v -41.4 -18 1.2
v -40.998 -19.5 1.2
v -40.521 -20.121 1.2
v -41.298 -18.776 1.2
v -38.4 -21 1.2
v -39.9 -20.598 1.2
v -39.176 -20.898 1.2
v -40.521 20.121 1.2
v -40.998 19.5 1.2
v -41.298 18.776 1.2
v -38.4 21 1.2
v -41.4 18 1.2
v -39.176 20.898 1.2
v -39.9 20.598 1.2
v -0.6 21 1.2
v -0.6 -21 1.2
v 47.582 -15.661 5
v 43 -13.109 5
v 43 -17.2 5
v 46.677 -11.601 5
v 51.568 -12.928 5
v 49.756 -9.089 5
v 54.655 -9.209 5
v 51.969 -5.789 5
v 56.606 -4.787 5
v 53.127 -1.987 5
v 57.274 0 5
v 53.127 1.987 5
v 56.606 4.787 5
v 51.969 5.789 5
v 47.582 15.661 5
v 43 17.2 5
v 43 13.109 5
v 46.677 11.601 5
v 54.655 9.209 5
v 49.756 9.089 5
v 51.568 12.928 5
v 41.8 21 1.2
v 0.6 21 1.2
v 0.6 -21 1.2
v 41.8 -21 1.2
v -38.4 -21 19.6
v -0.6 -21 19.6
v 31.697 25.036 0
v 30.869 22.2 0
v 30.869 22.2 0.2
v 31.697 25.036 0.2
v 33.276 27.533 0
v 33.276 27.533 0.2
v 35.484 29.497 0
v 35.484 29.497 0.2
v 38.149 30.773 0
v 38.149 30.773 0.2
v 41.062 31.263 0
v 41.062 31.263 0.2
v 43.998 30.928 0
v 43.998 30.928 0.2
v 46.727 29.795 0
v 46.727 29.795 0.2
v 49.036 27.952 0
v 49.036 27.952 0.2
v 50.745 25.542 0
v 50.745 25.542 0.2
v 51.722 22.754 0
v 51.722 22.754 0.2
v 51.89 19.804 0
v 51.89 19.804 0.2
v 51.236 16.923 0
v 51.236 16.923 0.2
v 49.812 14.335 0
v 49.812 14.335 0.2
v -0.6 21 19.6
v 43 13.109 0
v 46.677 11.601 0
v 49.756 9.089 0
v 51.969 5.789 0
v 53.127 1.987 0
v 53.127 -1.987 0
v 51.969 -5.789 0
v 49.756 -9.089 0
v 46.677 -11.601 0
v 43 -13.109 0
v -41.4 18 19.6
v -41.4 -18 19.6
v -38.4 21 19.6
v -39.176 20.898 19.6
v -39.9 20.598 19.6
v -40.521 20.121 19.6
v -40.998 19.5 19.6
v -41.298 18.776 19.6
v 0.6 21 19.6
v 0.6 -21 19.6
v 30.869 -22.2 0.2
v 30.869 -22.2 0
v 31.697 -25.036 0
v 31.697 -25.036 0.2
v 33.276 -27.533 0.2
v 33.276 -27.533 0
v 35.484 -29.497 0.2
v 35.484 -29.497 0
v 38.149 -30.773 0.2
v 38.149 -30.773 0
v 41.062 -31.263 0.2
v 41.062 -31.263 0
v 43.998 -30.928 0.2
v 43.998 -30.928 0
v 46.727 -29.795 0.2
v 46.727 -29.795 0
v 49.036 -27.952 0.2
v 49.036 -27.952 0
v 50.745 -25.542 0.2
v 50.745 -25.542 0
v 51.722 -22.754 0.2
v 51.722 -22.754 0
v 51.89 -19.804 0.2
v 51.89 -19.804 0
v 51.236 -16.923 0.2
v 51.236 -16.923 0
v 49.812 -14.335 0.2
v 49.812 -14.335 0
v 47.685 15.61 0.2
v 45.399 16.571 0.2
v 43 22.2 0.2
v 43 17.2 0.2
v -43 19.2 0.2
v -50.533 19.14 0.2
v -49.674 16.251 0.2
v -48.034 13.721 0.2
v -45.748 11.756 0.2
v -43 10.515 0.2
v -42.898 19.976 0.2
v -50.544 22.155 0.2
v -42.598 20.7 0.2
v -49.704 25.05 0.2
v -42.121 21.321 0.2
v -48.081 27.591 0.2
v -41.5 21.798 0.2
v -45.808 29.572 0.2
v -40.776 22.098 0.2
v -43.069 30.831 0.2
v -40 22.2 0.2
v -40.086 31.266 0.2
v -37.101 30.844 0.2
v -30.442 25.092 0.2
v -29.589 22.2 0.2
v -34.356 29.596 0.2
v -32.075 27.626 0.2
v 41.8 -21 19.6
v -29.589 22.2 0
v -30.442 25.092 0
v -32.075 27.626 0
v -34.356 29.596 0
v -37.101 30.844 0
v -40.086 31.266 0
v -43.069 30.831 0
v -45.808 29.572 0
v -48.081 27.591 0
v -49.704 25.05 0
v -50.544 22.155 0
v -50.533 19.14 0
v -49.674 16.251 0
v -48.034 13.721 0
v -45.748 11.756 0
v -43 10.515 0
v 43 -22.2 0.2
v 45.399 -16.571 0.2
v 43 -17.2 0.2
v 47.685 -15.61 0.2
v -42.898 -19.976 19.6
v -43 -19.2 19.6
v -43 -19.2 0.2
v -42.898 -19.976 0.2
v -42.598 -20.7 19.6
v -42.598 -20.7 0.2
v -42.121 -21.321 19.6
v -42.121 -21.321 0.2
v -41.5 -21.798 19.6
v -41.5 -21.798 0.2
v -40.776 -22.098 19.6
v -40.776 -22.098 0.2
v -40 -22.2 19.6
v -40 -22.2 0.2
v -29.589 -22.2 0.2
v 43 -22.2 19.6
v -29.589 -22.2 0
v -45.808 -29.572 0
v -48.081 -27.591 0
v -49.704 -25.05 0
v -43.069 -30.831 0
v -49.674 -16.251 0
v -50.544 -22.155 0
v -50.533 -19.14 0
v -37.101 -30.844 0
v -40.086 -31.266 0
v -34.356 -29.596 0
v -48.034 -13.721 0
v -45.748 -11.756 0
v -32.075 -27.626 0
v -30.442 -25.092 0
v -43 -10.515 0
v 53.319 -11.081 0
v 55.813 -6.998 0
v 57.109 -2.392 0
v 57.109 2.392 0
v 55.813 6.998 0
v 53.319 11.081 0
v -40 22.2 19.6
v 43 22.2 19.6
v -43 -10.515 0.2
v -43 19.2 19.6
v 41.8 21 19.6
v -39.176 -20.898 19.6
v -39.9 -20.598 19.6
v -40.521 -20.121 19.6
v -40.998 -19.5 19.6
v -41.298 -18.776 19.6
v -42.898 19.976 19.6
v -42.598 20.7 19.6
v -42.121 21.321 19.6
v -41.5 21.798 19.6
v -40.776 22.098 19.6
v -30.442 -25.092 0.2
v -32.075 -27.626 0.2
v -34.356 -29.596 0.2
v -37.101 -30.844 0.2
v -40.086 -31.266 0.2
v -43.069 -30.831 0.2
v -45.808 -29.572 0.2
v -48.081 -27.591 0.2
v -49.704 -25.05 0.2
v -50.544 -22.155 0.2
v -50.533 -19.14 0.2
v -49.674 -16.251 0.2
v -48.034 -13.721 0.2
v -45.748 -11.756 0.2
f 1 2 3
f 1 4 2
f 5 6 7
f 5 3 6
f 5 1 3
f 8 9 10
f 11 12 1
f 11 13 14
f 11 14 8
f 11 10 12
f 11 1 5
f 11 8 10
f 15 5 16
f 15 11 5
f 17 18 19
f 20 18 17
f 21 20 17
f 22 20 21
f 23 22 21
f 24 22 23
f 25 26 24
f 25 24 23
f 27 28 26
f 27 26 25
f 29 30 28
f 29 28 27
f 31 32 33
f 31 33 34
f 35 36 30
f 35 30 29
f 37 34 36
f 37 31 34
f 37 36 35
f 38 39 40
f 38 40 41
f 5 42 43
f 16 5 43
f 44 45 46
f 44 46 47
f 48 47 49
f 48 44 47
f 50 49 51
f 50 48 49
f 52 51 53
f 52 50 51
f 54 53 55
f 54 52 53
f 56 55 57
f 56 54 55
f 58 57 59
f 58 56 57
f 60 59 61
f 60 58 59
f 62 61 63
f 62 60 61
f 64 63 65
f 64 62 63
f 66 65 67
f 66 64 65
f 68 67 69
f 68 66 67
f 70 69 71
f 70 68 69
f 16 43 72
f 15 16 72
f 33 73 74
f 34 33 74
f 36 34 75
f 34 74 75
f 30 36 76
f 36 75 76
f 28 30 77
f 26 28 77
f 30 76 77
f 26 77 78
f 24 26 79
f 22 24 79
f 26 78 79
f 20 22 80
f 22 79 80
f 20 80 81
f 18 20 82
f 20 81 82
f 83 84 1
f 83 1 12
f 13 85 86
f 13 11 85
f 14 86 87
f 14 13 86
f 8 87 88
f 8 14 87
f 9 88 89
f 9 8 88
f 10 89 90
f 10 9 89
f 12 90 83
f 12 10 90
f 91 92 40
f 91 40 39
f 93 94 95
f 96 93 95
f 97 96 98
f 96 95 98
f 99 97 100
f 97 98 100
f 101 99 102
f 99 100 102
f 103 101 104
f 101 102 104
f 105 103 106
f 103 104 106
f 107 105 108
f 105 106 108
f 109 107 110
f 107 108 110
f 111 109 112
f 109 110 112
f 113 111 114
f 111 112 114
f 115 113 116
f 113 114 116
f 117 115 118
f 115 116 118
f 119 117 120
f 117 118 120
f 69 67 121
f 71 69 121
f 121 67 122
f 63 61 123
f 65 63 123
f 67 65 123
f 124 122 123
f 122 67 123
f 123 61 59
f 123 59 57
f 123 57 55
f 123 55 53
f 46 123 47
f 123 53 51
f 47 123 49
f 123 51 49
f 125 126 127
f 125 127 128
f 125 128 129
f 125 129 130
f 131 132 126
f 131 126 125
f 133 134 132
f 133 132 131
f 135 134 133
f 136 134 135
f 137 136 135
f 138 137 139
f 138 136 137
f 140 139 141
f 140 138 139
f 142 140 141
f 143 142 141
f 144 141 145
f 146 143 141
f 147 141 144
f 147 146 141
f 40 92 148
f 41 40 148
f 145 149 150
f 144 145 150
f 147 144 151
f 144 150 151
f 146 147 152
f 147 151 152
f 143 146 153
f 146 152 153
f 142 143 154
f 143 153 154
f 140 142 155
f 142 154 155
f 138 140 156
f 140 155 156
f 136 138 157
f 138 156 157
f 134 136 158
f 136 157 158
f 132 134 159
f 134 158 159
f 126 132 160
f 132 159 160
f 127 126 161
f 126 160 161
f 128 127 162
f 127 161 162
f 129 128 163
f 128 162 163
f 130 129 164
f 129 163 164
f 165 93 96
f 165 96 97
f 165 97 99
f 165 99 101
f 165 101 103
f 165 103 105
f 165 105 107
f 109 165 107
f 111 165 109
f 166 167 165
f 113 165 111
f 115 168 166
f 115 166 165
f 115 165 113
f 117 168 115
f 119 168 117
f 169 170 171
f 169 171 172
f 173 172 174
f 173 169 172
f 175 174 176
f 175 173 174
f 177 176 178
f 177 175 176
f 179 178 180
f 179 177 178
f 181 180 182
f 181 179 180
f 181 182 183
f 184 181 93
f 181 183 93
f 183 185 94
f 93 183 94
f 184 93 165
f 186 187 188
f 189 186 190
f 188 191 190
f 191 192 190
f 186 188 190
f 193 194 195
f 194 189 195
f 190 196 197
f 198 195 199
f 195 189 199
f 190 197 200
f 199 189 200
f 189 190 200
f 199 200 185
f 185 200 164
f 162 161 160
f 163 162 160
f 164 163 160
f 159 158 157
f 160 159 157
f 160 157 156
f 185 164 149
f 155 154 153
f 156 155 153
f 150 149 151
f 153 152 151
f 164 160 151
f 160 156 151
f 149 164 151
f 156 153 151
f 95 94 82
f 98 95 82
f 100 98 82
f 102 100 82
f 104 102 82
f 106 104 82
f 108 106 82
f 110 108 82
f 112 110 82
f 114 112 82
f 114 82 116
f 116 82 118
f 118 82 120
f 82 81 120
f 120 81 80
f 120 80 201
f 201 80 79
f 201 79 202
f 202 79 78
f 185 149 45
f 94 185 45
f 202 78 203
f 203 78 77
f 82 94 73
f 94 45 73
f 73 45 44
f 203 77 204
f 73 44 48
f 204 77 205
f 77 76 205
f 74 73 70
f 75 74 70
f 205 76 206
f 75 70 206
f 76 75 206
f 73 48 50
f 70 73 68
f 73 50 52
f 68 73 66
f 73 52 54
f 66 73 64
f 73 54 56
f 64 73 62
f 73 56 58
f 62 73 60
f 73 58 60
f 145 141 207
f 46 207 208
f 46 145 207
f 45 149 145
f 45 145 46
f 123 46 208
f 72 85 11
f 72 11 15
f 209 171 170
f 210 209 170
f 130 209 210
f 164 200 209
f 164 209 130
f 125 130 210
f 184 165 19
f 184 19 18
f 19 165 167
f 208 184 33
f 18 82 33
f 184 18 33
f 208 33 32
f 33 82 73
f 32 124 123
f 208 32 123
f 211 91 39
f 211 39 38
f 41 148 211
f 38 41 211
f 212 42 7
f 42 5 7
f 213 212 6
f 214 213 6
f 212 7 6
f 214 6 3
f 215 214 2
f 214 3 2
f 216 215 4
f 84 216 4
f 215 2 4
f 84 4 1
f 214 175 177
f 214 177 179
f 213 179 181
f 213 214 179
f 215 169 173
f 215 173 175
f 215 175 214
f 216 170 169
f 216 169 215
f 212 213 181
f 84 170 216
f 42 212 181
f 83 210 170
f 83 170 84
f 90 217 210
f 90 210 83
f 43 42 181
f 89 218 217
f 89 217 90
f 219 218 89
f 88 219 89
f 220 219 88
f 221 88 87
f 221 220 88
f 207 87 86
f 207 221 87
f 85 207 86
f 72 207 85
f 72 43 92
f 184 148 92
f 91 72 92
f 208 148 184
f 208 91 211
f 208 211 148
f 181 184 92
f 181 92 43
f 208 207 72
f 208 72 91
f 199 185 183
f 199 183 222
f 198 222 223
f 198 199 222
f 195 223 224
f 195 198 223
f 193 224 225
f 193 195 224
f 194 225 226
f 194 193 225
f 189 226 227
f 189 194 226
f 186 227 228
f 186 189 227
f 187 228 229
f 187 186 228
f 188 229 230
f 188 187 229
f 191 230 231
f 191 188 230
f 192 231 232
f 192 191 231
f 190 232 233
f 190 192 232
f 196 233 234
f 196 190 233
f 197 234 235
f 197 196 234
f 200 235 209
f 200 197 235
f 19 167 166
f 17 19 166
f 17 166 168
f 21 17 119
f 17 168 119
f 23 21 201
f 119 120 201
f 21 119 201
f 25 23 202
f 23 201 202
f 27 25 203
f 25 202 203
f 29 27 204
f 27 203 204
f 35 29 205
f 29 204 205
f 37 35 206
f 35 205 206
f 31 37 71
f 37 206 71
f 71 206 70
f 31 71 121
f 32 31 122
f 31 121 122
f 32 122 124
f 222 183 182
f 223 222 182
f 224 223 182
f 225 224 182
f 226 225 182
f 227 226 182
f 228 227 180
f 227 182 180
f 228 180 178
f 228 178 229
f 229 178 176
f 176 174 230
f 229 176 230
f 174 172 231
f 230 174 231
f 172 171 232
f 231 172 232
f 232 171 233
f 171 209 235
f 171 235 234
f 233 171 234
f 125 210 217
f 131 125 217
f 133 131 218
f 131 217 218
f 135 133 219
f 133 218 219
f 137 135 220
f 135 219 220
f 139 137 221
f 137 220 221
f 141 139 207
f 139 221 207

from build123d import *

# Parameters (mm, degrees)
SKETCH_1_W          = 86
SKETCH_1_H          = 44.4
EXTRUDE_1_DEPTH     = 19.6
EXTRUDE_2_DEPTH     = 5
SKETCH_3_W          = 40.8
SKETCH_3_H          = 42
SKETCH_3_W_2        = 41.2
CUT_EXTRUDE_1_DEPTH = 18.4
FILLET_1_R          = 3
EXTRUDE_3_DEPTH     = 0.2


with BuildPart() as part:
    # Эскиз1 → Бобышка-Вытянуть1 (new body)
    with BuildSketch(Plane.XY):
        Rectangle(SKETCH_1_W, SKETCH_1_H)
    extrude(amount=EXTRUDE_1_DEPTH)

    # Эскиз2 → Бобышка-Вытянуть2 (add)
    with BuildSketch(Plane.XY):
        with BuildLine():
            Line((43, 17.2), (43, 13.108775687))
            ThreePointArc((43, 13.108775687), (53.273546839, 0), (43, -13.108775687))
            Line((43, -13.108775687), (43, -17.2))
            ThreePointArc((43, -17.2), (57.273546839, 0), (43, 17.2))
        make_face()
    extrude(amount=EXTRUDE_2_DEPTH)

    # Эскиз3 → Вырез-Вытянуть1 (cut)
    with BuildSketch(Plane.XY.offset(19.6)):
        with Locations((-21, 0)):
            Rectangle(SKETCH_3_W, SKETCH_3_H)
        with Locations((21.2, 0)):
            Rectangle(SKETCH_3_W_2, SKETCH_3_H)
    extrude(amount=-CUT_EXTRUDE_1_DEPTH, mode=Mode.SUBTRACT)

    # Скругление1
    fillet_1_edges = [part.edges().sort_by_distance(p)[0] for p in [
        (-41.4, -21, 10.4),
        (-41.4, 21, 10.4),
        (-43, -22.2, 9.8),
        (-43, 22.2, 9.8),
    ]]
    fillet(fillet_1_edges, radius=FILLET_1_R)

    # Эскиз4 → Бобышка-Вытянуть3 (add)
    with BuildSketch(Plane(origin=(0, 0, 0), x_dir=(-1, 0, 0), z_dir=(0, 0, -1))):
        with BuildLine():
            Line((-49.811541671, 14.334875645), (-30.869317388, 22.2))
            ThreePointArc((-30.869317388, 22.2), (-45.401918337, 30.45743659), (-49.811541671, 14.334875645))
        make_face()
        with BuildLine():
            Line((43, 10.515346091), (29.589006911, 22.2))
            ThreePointArc((29.589006911, 22.2), (47.015516822, 28.662653345), (43, 10.515346091))
        make_face()
        with BuildLine():
            Line((43, -10.515346091), (29.589006911, -22.2))
            ThreePointArc((29.589006911, -22.2), (47.015516822, -28.662653345), (43, -10.515346091))
        make_face()
        with BuildLine():
            Line((-49.811541671, -14.334875645), (-30.869317388, -22.2))
            ThreePointArc((-30.869317388, -22.2), (-45.401918337, -30.45743659), (-49.811541671, -14.334875645))
        make_face()
    extrude(amount=-EXTRUDE_3_DEPTH)


solid = part.part
